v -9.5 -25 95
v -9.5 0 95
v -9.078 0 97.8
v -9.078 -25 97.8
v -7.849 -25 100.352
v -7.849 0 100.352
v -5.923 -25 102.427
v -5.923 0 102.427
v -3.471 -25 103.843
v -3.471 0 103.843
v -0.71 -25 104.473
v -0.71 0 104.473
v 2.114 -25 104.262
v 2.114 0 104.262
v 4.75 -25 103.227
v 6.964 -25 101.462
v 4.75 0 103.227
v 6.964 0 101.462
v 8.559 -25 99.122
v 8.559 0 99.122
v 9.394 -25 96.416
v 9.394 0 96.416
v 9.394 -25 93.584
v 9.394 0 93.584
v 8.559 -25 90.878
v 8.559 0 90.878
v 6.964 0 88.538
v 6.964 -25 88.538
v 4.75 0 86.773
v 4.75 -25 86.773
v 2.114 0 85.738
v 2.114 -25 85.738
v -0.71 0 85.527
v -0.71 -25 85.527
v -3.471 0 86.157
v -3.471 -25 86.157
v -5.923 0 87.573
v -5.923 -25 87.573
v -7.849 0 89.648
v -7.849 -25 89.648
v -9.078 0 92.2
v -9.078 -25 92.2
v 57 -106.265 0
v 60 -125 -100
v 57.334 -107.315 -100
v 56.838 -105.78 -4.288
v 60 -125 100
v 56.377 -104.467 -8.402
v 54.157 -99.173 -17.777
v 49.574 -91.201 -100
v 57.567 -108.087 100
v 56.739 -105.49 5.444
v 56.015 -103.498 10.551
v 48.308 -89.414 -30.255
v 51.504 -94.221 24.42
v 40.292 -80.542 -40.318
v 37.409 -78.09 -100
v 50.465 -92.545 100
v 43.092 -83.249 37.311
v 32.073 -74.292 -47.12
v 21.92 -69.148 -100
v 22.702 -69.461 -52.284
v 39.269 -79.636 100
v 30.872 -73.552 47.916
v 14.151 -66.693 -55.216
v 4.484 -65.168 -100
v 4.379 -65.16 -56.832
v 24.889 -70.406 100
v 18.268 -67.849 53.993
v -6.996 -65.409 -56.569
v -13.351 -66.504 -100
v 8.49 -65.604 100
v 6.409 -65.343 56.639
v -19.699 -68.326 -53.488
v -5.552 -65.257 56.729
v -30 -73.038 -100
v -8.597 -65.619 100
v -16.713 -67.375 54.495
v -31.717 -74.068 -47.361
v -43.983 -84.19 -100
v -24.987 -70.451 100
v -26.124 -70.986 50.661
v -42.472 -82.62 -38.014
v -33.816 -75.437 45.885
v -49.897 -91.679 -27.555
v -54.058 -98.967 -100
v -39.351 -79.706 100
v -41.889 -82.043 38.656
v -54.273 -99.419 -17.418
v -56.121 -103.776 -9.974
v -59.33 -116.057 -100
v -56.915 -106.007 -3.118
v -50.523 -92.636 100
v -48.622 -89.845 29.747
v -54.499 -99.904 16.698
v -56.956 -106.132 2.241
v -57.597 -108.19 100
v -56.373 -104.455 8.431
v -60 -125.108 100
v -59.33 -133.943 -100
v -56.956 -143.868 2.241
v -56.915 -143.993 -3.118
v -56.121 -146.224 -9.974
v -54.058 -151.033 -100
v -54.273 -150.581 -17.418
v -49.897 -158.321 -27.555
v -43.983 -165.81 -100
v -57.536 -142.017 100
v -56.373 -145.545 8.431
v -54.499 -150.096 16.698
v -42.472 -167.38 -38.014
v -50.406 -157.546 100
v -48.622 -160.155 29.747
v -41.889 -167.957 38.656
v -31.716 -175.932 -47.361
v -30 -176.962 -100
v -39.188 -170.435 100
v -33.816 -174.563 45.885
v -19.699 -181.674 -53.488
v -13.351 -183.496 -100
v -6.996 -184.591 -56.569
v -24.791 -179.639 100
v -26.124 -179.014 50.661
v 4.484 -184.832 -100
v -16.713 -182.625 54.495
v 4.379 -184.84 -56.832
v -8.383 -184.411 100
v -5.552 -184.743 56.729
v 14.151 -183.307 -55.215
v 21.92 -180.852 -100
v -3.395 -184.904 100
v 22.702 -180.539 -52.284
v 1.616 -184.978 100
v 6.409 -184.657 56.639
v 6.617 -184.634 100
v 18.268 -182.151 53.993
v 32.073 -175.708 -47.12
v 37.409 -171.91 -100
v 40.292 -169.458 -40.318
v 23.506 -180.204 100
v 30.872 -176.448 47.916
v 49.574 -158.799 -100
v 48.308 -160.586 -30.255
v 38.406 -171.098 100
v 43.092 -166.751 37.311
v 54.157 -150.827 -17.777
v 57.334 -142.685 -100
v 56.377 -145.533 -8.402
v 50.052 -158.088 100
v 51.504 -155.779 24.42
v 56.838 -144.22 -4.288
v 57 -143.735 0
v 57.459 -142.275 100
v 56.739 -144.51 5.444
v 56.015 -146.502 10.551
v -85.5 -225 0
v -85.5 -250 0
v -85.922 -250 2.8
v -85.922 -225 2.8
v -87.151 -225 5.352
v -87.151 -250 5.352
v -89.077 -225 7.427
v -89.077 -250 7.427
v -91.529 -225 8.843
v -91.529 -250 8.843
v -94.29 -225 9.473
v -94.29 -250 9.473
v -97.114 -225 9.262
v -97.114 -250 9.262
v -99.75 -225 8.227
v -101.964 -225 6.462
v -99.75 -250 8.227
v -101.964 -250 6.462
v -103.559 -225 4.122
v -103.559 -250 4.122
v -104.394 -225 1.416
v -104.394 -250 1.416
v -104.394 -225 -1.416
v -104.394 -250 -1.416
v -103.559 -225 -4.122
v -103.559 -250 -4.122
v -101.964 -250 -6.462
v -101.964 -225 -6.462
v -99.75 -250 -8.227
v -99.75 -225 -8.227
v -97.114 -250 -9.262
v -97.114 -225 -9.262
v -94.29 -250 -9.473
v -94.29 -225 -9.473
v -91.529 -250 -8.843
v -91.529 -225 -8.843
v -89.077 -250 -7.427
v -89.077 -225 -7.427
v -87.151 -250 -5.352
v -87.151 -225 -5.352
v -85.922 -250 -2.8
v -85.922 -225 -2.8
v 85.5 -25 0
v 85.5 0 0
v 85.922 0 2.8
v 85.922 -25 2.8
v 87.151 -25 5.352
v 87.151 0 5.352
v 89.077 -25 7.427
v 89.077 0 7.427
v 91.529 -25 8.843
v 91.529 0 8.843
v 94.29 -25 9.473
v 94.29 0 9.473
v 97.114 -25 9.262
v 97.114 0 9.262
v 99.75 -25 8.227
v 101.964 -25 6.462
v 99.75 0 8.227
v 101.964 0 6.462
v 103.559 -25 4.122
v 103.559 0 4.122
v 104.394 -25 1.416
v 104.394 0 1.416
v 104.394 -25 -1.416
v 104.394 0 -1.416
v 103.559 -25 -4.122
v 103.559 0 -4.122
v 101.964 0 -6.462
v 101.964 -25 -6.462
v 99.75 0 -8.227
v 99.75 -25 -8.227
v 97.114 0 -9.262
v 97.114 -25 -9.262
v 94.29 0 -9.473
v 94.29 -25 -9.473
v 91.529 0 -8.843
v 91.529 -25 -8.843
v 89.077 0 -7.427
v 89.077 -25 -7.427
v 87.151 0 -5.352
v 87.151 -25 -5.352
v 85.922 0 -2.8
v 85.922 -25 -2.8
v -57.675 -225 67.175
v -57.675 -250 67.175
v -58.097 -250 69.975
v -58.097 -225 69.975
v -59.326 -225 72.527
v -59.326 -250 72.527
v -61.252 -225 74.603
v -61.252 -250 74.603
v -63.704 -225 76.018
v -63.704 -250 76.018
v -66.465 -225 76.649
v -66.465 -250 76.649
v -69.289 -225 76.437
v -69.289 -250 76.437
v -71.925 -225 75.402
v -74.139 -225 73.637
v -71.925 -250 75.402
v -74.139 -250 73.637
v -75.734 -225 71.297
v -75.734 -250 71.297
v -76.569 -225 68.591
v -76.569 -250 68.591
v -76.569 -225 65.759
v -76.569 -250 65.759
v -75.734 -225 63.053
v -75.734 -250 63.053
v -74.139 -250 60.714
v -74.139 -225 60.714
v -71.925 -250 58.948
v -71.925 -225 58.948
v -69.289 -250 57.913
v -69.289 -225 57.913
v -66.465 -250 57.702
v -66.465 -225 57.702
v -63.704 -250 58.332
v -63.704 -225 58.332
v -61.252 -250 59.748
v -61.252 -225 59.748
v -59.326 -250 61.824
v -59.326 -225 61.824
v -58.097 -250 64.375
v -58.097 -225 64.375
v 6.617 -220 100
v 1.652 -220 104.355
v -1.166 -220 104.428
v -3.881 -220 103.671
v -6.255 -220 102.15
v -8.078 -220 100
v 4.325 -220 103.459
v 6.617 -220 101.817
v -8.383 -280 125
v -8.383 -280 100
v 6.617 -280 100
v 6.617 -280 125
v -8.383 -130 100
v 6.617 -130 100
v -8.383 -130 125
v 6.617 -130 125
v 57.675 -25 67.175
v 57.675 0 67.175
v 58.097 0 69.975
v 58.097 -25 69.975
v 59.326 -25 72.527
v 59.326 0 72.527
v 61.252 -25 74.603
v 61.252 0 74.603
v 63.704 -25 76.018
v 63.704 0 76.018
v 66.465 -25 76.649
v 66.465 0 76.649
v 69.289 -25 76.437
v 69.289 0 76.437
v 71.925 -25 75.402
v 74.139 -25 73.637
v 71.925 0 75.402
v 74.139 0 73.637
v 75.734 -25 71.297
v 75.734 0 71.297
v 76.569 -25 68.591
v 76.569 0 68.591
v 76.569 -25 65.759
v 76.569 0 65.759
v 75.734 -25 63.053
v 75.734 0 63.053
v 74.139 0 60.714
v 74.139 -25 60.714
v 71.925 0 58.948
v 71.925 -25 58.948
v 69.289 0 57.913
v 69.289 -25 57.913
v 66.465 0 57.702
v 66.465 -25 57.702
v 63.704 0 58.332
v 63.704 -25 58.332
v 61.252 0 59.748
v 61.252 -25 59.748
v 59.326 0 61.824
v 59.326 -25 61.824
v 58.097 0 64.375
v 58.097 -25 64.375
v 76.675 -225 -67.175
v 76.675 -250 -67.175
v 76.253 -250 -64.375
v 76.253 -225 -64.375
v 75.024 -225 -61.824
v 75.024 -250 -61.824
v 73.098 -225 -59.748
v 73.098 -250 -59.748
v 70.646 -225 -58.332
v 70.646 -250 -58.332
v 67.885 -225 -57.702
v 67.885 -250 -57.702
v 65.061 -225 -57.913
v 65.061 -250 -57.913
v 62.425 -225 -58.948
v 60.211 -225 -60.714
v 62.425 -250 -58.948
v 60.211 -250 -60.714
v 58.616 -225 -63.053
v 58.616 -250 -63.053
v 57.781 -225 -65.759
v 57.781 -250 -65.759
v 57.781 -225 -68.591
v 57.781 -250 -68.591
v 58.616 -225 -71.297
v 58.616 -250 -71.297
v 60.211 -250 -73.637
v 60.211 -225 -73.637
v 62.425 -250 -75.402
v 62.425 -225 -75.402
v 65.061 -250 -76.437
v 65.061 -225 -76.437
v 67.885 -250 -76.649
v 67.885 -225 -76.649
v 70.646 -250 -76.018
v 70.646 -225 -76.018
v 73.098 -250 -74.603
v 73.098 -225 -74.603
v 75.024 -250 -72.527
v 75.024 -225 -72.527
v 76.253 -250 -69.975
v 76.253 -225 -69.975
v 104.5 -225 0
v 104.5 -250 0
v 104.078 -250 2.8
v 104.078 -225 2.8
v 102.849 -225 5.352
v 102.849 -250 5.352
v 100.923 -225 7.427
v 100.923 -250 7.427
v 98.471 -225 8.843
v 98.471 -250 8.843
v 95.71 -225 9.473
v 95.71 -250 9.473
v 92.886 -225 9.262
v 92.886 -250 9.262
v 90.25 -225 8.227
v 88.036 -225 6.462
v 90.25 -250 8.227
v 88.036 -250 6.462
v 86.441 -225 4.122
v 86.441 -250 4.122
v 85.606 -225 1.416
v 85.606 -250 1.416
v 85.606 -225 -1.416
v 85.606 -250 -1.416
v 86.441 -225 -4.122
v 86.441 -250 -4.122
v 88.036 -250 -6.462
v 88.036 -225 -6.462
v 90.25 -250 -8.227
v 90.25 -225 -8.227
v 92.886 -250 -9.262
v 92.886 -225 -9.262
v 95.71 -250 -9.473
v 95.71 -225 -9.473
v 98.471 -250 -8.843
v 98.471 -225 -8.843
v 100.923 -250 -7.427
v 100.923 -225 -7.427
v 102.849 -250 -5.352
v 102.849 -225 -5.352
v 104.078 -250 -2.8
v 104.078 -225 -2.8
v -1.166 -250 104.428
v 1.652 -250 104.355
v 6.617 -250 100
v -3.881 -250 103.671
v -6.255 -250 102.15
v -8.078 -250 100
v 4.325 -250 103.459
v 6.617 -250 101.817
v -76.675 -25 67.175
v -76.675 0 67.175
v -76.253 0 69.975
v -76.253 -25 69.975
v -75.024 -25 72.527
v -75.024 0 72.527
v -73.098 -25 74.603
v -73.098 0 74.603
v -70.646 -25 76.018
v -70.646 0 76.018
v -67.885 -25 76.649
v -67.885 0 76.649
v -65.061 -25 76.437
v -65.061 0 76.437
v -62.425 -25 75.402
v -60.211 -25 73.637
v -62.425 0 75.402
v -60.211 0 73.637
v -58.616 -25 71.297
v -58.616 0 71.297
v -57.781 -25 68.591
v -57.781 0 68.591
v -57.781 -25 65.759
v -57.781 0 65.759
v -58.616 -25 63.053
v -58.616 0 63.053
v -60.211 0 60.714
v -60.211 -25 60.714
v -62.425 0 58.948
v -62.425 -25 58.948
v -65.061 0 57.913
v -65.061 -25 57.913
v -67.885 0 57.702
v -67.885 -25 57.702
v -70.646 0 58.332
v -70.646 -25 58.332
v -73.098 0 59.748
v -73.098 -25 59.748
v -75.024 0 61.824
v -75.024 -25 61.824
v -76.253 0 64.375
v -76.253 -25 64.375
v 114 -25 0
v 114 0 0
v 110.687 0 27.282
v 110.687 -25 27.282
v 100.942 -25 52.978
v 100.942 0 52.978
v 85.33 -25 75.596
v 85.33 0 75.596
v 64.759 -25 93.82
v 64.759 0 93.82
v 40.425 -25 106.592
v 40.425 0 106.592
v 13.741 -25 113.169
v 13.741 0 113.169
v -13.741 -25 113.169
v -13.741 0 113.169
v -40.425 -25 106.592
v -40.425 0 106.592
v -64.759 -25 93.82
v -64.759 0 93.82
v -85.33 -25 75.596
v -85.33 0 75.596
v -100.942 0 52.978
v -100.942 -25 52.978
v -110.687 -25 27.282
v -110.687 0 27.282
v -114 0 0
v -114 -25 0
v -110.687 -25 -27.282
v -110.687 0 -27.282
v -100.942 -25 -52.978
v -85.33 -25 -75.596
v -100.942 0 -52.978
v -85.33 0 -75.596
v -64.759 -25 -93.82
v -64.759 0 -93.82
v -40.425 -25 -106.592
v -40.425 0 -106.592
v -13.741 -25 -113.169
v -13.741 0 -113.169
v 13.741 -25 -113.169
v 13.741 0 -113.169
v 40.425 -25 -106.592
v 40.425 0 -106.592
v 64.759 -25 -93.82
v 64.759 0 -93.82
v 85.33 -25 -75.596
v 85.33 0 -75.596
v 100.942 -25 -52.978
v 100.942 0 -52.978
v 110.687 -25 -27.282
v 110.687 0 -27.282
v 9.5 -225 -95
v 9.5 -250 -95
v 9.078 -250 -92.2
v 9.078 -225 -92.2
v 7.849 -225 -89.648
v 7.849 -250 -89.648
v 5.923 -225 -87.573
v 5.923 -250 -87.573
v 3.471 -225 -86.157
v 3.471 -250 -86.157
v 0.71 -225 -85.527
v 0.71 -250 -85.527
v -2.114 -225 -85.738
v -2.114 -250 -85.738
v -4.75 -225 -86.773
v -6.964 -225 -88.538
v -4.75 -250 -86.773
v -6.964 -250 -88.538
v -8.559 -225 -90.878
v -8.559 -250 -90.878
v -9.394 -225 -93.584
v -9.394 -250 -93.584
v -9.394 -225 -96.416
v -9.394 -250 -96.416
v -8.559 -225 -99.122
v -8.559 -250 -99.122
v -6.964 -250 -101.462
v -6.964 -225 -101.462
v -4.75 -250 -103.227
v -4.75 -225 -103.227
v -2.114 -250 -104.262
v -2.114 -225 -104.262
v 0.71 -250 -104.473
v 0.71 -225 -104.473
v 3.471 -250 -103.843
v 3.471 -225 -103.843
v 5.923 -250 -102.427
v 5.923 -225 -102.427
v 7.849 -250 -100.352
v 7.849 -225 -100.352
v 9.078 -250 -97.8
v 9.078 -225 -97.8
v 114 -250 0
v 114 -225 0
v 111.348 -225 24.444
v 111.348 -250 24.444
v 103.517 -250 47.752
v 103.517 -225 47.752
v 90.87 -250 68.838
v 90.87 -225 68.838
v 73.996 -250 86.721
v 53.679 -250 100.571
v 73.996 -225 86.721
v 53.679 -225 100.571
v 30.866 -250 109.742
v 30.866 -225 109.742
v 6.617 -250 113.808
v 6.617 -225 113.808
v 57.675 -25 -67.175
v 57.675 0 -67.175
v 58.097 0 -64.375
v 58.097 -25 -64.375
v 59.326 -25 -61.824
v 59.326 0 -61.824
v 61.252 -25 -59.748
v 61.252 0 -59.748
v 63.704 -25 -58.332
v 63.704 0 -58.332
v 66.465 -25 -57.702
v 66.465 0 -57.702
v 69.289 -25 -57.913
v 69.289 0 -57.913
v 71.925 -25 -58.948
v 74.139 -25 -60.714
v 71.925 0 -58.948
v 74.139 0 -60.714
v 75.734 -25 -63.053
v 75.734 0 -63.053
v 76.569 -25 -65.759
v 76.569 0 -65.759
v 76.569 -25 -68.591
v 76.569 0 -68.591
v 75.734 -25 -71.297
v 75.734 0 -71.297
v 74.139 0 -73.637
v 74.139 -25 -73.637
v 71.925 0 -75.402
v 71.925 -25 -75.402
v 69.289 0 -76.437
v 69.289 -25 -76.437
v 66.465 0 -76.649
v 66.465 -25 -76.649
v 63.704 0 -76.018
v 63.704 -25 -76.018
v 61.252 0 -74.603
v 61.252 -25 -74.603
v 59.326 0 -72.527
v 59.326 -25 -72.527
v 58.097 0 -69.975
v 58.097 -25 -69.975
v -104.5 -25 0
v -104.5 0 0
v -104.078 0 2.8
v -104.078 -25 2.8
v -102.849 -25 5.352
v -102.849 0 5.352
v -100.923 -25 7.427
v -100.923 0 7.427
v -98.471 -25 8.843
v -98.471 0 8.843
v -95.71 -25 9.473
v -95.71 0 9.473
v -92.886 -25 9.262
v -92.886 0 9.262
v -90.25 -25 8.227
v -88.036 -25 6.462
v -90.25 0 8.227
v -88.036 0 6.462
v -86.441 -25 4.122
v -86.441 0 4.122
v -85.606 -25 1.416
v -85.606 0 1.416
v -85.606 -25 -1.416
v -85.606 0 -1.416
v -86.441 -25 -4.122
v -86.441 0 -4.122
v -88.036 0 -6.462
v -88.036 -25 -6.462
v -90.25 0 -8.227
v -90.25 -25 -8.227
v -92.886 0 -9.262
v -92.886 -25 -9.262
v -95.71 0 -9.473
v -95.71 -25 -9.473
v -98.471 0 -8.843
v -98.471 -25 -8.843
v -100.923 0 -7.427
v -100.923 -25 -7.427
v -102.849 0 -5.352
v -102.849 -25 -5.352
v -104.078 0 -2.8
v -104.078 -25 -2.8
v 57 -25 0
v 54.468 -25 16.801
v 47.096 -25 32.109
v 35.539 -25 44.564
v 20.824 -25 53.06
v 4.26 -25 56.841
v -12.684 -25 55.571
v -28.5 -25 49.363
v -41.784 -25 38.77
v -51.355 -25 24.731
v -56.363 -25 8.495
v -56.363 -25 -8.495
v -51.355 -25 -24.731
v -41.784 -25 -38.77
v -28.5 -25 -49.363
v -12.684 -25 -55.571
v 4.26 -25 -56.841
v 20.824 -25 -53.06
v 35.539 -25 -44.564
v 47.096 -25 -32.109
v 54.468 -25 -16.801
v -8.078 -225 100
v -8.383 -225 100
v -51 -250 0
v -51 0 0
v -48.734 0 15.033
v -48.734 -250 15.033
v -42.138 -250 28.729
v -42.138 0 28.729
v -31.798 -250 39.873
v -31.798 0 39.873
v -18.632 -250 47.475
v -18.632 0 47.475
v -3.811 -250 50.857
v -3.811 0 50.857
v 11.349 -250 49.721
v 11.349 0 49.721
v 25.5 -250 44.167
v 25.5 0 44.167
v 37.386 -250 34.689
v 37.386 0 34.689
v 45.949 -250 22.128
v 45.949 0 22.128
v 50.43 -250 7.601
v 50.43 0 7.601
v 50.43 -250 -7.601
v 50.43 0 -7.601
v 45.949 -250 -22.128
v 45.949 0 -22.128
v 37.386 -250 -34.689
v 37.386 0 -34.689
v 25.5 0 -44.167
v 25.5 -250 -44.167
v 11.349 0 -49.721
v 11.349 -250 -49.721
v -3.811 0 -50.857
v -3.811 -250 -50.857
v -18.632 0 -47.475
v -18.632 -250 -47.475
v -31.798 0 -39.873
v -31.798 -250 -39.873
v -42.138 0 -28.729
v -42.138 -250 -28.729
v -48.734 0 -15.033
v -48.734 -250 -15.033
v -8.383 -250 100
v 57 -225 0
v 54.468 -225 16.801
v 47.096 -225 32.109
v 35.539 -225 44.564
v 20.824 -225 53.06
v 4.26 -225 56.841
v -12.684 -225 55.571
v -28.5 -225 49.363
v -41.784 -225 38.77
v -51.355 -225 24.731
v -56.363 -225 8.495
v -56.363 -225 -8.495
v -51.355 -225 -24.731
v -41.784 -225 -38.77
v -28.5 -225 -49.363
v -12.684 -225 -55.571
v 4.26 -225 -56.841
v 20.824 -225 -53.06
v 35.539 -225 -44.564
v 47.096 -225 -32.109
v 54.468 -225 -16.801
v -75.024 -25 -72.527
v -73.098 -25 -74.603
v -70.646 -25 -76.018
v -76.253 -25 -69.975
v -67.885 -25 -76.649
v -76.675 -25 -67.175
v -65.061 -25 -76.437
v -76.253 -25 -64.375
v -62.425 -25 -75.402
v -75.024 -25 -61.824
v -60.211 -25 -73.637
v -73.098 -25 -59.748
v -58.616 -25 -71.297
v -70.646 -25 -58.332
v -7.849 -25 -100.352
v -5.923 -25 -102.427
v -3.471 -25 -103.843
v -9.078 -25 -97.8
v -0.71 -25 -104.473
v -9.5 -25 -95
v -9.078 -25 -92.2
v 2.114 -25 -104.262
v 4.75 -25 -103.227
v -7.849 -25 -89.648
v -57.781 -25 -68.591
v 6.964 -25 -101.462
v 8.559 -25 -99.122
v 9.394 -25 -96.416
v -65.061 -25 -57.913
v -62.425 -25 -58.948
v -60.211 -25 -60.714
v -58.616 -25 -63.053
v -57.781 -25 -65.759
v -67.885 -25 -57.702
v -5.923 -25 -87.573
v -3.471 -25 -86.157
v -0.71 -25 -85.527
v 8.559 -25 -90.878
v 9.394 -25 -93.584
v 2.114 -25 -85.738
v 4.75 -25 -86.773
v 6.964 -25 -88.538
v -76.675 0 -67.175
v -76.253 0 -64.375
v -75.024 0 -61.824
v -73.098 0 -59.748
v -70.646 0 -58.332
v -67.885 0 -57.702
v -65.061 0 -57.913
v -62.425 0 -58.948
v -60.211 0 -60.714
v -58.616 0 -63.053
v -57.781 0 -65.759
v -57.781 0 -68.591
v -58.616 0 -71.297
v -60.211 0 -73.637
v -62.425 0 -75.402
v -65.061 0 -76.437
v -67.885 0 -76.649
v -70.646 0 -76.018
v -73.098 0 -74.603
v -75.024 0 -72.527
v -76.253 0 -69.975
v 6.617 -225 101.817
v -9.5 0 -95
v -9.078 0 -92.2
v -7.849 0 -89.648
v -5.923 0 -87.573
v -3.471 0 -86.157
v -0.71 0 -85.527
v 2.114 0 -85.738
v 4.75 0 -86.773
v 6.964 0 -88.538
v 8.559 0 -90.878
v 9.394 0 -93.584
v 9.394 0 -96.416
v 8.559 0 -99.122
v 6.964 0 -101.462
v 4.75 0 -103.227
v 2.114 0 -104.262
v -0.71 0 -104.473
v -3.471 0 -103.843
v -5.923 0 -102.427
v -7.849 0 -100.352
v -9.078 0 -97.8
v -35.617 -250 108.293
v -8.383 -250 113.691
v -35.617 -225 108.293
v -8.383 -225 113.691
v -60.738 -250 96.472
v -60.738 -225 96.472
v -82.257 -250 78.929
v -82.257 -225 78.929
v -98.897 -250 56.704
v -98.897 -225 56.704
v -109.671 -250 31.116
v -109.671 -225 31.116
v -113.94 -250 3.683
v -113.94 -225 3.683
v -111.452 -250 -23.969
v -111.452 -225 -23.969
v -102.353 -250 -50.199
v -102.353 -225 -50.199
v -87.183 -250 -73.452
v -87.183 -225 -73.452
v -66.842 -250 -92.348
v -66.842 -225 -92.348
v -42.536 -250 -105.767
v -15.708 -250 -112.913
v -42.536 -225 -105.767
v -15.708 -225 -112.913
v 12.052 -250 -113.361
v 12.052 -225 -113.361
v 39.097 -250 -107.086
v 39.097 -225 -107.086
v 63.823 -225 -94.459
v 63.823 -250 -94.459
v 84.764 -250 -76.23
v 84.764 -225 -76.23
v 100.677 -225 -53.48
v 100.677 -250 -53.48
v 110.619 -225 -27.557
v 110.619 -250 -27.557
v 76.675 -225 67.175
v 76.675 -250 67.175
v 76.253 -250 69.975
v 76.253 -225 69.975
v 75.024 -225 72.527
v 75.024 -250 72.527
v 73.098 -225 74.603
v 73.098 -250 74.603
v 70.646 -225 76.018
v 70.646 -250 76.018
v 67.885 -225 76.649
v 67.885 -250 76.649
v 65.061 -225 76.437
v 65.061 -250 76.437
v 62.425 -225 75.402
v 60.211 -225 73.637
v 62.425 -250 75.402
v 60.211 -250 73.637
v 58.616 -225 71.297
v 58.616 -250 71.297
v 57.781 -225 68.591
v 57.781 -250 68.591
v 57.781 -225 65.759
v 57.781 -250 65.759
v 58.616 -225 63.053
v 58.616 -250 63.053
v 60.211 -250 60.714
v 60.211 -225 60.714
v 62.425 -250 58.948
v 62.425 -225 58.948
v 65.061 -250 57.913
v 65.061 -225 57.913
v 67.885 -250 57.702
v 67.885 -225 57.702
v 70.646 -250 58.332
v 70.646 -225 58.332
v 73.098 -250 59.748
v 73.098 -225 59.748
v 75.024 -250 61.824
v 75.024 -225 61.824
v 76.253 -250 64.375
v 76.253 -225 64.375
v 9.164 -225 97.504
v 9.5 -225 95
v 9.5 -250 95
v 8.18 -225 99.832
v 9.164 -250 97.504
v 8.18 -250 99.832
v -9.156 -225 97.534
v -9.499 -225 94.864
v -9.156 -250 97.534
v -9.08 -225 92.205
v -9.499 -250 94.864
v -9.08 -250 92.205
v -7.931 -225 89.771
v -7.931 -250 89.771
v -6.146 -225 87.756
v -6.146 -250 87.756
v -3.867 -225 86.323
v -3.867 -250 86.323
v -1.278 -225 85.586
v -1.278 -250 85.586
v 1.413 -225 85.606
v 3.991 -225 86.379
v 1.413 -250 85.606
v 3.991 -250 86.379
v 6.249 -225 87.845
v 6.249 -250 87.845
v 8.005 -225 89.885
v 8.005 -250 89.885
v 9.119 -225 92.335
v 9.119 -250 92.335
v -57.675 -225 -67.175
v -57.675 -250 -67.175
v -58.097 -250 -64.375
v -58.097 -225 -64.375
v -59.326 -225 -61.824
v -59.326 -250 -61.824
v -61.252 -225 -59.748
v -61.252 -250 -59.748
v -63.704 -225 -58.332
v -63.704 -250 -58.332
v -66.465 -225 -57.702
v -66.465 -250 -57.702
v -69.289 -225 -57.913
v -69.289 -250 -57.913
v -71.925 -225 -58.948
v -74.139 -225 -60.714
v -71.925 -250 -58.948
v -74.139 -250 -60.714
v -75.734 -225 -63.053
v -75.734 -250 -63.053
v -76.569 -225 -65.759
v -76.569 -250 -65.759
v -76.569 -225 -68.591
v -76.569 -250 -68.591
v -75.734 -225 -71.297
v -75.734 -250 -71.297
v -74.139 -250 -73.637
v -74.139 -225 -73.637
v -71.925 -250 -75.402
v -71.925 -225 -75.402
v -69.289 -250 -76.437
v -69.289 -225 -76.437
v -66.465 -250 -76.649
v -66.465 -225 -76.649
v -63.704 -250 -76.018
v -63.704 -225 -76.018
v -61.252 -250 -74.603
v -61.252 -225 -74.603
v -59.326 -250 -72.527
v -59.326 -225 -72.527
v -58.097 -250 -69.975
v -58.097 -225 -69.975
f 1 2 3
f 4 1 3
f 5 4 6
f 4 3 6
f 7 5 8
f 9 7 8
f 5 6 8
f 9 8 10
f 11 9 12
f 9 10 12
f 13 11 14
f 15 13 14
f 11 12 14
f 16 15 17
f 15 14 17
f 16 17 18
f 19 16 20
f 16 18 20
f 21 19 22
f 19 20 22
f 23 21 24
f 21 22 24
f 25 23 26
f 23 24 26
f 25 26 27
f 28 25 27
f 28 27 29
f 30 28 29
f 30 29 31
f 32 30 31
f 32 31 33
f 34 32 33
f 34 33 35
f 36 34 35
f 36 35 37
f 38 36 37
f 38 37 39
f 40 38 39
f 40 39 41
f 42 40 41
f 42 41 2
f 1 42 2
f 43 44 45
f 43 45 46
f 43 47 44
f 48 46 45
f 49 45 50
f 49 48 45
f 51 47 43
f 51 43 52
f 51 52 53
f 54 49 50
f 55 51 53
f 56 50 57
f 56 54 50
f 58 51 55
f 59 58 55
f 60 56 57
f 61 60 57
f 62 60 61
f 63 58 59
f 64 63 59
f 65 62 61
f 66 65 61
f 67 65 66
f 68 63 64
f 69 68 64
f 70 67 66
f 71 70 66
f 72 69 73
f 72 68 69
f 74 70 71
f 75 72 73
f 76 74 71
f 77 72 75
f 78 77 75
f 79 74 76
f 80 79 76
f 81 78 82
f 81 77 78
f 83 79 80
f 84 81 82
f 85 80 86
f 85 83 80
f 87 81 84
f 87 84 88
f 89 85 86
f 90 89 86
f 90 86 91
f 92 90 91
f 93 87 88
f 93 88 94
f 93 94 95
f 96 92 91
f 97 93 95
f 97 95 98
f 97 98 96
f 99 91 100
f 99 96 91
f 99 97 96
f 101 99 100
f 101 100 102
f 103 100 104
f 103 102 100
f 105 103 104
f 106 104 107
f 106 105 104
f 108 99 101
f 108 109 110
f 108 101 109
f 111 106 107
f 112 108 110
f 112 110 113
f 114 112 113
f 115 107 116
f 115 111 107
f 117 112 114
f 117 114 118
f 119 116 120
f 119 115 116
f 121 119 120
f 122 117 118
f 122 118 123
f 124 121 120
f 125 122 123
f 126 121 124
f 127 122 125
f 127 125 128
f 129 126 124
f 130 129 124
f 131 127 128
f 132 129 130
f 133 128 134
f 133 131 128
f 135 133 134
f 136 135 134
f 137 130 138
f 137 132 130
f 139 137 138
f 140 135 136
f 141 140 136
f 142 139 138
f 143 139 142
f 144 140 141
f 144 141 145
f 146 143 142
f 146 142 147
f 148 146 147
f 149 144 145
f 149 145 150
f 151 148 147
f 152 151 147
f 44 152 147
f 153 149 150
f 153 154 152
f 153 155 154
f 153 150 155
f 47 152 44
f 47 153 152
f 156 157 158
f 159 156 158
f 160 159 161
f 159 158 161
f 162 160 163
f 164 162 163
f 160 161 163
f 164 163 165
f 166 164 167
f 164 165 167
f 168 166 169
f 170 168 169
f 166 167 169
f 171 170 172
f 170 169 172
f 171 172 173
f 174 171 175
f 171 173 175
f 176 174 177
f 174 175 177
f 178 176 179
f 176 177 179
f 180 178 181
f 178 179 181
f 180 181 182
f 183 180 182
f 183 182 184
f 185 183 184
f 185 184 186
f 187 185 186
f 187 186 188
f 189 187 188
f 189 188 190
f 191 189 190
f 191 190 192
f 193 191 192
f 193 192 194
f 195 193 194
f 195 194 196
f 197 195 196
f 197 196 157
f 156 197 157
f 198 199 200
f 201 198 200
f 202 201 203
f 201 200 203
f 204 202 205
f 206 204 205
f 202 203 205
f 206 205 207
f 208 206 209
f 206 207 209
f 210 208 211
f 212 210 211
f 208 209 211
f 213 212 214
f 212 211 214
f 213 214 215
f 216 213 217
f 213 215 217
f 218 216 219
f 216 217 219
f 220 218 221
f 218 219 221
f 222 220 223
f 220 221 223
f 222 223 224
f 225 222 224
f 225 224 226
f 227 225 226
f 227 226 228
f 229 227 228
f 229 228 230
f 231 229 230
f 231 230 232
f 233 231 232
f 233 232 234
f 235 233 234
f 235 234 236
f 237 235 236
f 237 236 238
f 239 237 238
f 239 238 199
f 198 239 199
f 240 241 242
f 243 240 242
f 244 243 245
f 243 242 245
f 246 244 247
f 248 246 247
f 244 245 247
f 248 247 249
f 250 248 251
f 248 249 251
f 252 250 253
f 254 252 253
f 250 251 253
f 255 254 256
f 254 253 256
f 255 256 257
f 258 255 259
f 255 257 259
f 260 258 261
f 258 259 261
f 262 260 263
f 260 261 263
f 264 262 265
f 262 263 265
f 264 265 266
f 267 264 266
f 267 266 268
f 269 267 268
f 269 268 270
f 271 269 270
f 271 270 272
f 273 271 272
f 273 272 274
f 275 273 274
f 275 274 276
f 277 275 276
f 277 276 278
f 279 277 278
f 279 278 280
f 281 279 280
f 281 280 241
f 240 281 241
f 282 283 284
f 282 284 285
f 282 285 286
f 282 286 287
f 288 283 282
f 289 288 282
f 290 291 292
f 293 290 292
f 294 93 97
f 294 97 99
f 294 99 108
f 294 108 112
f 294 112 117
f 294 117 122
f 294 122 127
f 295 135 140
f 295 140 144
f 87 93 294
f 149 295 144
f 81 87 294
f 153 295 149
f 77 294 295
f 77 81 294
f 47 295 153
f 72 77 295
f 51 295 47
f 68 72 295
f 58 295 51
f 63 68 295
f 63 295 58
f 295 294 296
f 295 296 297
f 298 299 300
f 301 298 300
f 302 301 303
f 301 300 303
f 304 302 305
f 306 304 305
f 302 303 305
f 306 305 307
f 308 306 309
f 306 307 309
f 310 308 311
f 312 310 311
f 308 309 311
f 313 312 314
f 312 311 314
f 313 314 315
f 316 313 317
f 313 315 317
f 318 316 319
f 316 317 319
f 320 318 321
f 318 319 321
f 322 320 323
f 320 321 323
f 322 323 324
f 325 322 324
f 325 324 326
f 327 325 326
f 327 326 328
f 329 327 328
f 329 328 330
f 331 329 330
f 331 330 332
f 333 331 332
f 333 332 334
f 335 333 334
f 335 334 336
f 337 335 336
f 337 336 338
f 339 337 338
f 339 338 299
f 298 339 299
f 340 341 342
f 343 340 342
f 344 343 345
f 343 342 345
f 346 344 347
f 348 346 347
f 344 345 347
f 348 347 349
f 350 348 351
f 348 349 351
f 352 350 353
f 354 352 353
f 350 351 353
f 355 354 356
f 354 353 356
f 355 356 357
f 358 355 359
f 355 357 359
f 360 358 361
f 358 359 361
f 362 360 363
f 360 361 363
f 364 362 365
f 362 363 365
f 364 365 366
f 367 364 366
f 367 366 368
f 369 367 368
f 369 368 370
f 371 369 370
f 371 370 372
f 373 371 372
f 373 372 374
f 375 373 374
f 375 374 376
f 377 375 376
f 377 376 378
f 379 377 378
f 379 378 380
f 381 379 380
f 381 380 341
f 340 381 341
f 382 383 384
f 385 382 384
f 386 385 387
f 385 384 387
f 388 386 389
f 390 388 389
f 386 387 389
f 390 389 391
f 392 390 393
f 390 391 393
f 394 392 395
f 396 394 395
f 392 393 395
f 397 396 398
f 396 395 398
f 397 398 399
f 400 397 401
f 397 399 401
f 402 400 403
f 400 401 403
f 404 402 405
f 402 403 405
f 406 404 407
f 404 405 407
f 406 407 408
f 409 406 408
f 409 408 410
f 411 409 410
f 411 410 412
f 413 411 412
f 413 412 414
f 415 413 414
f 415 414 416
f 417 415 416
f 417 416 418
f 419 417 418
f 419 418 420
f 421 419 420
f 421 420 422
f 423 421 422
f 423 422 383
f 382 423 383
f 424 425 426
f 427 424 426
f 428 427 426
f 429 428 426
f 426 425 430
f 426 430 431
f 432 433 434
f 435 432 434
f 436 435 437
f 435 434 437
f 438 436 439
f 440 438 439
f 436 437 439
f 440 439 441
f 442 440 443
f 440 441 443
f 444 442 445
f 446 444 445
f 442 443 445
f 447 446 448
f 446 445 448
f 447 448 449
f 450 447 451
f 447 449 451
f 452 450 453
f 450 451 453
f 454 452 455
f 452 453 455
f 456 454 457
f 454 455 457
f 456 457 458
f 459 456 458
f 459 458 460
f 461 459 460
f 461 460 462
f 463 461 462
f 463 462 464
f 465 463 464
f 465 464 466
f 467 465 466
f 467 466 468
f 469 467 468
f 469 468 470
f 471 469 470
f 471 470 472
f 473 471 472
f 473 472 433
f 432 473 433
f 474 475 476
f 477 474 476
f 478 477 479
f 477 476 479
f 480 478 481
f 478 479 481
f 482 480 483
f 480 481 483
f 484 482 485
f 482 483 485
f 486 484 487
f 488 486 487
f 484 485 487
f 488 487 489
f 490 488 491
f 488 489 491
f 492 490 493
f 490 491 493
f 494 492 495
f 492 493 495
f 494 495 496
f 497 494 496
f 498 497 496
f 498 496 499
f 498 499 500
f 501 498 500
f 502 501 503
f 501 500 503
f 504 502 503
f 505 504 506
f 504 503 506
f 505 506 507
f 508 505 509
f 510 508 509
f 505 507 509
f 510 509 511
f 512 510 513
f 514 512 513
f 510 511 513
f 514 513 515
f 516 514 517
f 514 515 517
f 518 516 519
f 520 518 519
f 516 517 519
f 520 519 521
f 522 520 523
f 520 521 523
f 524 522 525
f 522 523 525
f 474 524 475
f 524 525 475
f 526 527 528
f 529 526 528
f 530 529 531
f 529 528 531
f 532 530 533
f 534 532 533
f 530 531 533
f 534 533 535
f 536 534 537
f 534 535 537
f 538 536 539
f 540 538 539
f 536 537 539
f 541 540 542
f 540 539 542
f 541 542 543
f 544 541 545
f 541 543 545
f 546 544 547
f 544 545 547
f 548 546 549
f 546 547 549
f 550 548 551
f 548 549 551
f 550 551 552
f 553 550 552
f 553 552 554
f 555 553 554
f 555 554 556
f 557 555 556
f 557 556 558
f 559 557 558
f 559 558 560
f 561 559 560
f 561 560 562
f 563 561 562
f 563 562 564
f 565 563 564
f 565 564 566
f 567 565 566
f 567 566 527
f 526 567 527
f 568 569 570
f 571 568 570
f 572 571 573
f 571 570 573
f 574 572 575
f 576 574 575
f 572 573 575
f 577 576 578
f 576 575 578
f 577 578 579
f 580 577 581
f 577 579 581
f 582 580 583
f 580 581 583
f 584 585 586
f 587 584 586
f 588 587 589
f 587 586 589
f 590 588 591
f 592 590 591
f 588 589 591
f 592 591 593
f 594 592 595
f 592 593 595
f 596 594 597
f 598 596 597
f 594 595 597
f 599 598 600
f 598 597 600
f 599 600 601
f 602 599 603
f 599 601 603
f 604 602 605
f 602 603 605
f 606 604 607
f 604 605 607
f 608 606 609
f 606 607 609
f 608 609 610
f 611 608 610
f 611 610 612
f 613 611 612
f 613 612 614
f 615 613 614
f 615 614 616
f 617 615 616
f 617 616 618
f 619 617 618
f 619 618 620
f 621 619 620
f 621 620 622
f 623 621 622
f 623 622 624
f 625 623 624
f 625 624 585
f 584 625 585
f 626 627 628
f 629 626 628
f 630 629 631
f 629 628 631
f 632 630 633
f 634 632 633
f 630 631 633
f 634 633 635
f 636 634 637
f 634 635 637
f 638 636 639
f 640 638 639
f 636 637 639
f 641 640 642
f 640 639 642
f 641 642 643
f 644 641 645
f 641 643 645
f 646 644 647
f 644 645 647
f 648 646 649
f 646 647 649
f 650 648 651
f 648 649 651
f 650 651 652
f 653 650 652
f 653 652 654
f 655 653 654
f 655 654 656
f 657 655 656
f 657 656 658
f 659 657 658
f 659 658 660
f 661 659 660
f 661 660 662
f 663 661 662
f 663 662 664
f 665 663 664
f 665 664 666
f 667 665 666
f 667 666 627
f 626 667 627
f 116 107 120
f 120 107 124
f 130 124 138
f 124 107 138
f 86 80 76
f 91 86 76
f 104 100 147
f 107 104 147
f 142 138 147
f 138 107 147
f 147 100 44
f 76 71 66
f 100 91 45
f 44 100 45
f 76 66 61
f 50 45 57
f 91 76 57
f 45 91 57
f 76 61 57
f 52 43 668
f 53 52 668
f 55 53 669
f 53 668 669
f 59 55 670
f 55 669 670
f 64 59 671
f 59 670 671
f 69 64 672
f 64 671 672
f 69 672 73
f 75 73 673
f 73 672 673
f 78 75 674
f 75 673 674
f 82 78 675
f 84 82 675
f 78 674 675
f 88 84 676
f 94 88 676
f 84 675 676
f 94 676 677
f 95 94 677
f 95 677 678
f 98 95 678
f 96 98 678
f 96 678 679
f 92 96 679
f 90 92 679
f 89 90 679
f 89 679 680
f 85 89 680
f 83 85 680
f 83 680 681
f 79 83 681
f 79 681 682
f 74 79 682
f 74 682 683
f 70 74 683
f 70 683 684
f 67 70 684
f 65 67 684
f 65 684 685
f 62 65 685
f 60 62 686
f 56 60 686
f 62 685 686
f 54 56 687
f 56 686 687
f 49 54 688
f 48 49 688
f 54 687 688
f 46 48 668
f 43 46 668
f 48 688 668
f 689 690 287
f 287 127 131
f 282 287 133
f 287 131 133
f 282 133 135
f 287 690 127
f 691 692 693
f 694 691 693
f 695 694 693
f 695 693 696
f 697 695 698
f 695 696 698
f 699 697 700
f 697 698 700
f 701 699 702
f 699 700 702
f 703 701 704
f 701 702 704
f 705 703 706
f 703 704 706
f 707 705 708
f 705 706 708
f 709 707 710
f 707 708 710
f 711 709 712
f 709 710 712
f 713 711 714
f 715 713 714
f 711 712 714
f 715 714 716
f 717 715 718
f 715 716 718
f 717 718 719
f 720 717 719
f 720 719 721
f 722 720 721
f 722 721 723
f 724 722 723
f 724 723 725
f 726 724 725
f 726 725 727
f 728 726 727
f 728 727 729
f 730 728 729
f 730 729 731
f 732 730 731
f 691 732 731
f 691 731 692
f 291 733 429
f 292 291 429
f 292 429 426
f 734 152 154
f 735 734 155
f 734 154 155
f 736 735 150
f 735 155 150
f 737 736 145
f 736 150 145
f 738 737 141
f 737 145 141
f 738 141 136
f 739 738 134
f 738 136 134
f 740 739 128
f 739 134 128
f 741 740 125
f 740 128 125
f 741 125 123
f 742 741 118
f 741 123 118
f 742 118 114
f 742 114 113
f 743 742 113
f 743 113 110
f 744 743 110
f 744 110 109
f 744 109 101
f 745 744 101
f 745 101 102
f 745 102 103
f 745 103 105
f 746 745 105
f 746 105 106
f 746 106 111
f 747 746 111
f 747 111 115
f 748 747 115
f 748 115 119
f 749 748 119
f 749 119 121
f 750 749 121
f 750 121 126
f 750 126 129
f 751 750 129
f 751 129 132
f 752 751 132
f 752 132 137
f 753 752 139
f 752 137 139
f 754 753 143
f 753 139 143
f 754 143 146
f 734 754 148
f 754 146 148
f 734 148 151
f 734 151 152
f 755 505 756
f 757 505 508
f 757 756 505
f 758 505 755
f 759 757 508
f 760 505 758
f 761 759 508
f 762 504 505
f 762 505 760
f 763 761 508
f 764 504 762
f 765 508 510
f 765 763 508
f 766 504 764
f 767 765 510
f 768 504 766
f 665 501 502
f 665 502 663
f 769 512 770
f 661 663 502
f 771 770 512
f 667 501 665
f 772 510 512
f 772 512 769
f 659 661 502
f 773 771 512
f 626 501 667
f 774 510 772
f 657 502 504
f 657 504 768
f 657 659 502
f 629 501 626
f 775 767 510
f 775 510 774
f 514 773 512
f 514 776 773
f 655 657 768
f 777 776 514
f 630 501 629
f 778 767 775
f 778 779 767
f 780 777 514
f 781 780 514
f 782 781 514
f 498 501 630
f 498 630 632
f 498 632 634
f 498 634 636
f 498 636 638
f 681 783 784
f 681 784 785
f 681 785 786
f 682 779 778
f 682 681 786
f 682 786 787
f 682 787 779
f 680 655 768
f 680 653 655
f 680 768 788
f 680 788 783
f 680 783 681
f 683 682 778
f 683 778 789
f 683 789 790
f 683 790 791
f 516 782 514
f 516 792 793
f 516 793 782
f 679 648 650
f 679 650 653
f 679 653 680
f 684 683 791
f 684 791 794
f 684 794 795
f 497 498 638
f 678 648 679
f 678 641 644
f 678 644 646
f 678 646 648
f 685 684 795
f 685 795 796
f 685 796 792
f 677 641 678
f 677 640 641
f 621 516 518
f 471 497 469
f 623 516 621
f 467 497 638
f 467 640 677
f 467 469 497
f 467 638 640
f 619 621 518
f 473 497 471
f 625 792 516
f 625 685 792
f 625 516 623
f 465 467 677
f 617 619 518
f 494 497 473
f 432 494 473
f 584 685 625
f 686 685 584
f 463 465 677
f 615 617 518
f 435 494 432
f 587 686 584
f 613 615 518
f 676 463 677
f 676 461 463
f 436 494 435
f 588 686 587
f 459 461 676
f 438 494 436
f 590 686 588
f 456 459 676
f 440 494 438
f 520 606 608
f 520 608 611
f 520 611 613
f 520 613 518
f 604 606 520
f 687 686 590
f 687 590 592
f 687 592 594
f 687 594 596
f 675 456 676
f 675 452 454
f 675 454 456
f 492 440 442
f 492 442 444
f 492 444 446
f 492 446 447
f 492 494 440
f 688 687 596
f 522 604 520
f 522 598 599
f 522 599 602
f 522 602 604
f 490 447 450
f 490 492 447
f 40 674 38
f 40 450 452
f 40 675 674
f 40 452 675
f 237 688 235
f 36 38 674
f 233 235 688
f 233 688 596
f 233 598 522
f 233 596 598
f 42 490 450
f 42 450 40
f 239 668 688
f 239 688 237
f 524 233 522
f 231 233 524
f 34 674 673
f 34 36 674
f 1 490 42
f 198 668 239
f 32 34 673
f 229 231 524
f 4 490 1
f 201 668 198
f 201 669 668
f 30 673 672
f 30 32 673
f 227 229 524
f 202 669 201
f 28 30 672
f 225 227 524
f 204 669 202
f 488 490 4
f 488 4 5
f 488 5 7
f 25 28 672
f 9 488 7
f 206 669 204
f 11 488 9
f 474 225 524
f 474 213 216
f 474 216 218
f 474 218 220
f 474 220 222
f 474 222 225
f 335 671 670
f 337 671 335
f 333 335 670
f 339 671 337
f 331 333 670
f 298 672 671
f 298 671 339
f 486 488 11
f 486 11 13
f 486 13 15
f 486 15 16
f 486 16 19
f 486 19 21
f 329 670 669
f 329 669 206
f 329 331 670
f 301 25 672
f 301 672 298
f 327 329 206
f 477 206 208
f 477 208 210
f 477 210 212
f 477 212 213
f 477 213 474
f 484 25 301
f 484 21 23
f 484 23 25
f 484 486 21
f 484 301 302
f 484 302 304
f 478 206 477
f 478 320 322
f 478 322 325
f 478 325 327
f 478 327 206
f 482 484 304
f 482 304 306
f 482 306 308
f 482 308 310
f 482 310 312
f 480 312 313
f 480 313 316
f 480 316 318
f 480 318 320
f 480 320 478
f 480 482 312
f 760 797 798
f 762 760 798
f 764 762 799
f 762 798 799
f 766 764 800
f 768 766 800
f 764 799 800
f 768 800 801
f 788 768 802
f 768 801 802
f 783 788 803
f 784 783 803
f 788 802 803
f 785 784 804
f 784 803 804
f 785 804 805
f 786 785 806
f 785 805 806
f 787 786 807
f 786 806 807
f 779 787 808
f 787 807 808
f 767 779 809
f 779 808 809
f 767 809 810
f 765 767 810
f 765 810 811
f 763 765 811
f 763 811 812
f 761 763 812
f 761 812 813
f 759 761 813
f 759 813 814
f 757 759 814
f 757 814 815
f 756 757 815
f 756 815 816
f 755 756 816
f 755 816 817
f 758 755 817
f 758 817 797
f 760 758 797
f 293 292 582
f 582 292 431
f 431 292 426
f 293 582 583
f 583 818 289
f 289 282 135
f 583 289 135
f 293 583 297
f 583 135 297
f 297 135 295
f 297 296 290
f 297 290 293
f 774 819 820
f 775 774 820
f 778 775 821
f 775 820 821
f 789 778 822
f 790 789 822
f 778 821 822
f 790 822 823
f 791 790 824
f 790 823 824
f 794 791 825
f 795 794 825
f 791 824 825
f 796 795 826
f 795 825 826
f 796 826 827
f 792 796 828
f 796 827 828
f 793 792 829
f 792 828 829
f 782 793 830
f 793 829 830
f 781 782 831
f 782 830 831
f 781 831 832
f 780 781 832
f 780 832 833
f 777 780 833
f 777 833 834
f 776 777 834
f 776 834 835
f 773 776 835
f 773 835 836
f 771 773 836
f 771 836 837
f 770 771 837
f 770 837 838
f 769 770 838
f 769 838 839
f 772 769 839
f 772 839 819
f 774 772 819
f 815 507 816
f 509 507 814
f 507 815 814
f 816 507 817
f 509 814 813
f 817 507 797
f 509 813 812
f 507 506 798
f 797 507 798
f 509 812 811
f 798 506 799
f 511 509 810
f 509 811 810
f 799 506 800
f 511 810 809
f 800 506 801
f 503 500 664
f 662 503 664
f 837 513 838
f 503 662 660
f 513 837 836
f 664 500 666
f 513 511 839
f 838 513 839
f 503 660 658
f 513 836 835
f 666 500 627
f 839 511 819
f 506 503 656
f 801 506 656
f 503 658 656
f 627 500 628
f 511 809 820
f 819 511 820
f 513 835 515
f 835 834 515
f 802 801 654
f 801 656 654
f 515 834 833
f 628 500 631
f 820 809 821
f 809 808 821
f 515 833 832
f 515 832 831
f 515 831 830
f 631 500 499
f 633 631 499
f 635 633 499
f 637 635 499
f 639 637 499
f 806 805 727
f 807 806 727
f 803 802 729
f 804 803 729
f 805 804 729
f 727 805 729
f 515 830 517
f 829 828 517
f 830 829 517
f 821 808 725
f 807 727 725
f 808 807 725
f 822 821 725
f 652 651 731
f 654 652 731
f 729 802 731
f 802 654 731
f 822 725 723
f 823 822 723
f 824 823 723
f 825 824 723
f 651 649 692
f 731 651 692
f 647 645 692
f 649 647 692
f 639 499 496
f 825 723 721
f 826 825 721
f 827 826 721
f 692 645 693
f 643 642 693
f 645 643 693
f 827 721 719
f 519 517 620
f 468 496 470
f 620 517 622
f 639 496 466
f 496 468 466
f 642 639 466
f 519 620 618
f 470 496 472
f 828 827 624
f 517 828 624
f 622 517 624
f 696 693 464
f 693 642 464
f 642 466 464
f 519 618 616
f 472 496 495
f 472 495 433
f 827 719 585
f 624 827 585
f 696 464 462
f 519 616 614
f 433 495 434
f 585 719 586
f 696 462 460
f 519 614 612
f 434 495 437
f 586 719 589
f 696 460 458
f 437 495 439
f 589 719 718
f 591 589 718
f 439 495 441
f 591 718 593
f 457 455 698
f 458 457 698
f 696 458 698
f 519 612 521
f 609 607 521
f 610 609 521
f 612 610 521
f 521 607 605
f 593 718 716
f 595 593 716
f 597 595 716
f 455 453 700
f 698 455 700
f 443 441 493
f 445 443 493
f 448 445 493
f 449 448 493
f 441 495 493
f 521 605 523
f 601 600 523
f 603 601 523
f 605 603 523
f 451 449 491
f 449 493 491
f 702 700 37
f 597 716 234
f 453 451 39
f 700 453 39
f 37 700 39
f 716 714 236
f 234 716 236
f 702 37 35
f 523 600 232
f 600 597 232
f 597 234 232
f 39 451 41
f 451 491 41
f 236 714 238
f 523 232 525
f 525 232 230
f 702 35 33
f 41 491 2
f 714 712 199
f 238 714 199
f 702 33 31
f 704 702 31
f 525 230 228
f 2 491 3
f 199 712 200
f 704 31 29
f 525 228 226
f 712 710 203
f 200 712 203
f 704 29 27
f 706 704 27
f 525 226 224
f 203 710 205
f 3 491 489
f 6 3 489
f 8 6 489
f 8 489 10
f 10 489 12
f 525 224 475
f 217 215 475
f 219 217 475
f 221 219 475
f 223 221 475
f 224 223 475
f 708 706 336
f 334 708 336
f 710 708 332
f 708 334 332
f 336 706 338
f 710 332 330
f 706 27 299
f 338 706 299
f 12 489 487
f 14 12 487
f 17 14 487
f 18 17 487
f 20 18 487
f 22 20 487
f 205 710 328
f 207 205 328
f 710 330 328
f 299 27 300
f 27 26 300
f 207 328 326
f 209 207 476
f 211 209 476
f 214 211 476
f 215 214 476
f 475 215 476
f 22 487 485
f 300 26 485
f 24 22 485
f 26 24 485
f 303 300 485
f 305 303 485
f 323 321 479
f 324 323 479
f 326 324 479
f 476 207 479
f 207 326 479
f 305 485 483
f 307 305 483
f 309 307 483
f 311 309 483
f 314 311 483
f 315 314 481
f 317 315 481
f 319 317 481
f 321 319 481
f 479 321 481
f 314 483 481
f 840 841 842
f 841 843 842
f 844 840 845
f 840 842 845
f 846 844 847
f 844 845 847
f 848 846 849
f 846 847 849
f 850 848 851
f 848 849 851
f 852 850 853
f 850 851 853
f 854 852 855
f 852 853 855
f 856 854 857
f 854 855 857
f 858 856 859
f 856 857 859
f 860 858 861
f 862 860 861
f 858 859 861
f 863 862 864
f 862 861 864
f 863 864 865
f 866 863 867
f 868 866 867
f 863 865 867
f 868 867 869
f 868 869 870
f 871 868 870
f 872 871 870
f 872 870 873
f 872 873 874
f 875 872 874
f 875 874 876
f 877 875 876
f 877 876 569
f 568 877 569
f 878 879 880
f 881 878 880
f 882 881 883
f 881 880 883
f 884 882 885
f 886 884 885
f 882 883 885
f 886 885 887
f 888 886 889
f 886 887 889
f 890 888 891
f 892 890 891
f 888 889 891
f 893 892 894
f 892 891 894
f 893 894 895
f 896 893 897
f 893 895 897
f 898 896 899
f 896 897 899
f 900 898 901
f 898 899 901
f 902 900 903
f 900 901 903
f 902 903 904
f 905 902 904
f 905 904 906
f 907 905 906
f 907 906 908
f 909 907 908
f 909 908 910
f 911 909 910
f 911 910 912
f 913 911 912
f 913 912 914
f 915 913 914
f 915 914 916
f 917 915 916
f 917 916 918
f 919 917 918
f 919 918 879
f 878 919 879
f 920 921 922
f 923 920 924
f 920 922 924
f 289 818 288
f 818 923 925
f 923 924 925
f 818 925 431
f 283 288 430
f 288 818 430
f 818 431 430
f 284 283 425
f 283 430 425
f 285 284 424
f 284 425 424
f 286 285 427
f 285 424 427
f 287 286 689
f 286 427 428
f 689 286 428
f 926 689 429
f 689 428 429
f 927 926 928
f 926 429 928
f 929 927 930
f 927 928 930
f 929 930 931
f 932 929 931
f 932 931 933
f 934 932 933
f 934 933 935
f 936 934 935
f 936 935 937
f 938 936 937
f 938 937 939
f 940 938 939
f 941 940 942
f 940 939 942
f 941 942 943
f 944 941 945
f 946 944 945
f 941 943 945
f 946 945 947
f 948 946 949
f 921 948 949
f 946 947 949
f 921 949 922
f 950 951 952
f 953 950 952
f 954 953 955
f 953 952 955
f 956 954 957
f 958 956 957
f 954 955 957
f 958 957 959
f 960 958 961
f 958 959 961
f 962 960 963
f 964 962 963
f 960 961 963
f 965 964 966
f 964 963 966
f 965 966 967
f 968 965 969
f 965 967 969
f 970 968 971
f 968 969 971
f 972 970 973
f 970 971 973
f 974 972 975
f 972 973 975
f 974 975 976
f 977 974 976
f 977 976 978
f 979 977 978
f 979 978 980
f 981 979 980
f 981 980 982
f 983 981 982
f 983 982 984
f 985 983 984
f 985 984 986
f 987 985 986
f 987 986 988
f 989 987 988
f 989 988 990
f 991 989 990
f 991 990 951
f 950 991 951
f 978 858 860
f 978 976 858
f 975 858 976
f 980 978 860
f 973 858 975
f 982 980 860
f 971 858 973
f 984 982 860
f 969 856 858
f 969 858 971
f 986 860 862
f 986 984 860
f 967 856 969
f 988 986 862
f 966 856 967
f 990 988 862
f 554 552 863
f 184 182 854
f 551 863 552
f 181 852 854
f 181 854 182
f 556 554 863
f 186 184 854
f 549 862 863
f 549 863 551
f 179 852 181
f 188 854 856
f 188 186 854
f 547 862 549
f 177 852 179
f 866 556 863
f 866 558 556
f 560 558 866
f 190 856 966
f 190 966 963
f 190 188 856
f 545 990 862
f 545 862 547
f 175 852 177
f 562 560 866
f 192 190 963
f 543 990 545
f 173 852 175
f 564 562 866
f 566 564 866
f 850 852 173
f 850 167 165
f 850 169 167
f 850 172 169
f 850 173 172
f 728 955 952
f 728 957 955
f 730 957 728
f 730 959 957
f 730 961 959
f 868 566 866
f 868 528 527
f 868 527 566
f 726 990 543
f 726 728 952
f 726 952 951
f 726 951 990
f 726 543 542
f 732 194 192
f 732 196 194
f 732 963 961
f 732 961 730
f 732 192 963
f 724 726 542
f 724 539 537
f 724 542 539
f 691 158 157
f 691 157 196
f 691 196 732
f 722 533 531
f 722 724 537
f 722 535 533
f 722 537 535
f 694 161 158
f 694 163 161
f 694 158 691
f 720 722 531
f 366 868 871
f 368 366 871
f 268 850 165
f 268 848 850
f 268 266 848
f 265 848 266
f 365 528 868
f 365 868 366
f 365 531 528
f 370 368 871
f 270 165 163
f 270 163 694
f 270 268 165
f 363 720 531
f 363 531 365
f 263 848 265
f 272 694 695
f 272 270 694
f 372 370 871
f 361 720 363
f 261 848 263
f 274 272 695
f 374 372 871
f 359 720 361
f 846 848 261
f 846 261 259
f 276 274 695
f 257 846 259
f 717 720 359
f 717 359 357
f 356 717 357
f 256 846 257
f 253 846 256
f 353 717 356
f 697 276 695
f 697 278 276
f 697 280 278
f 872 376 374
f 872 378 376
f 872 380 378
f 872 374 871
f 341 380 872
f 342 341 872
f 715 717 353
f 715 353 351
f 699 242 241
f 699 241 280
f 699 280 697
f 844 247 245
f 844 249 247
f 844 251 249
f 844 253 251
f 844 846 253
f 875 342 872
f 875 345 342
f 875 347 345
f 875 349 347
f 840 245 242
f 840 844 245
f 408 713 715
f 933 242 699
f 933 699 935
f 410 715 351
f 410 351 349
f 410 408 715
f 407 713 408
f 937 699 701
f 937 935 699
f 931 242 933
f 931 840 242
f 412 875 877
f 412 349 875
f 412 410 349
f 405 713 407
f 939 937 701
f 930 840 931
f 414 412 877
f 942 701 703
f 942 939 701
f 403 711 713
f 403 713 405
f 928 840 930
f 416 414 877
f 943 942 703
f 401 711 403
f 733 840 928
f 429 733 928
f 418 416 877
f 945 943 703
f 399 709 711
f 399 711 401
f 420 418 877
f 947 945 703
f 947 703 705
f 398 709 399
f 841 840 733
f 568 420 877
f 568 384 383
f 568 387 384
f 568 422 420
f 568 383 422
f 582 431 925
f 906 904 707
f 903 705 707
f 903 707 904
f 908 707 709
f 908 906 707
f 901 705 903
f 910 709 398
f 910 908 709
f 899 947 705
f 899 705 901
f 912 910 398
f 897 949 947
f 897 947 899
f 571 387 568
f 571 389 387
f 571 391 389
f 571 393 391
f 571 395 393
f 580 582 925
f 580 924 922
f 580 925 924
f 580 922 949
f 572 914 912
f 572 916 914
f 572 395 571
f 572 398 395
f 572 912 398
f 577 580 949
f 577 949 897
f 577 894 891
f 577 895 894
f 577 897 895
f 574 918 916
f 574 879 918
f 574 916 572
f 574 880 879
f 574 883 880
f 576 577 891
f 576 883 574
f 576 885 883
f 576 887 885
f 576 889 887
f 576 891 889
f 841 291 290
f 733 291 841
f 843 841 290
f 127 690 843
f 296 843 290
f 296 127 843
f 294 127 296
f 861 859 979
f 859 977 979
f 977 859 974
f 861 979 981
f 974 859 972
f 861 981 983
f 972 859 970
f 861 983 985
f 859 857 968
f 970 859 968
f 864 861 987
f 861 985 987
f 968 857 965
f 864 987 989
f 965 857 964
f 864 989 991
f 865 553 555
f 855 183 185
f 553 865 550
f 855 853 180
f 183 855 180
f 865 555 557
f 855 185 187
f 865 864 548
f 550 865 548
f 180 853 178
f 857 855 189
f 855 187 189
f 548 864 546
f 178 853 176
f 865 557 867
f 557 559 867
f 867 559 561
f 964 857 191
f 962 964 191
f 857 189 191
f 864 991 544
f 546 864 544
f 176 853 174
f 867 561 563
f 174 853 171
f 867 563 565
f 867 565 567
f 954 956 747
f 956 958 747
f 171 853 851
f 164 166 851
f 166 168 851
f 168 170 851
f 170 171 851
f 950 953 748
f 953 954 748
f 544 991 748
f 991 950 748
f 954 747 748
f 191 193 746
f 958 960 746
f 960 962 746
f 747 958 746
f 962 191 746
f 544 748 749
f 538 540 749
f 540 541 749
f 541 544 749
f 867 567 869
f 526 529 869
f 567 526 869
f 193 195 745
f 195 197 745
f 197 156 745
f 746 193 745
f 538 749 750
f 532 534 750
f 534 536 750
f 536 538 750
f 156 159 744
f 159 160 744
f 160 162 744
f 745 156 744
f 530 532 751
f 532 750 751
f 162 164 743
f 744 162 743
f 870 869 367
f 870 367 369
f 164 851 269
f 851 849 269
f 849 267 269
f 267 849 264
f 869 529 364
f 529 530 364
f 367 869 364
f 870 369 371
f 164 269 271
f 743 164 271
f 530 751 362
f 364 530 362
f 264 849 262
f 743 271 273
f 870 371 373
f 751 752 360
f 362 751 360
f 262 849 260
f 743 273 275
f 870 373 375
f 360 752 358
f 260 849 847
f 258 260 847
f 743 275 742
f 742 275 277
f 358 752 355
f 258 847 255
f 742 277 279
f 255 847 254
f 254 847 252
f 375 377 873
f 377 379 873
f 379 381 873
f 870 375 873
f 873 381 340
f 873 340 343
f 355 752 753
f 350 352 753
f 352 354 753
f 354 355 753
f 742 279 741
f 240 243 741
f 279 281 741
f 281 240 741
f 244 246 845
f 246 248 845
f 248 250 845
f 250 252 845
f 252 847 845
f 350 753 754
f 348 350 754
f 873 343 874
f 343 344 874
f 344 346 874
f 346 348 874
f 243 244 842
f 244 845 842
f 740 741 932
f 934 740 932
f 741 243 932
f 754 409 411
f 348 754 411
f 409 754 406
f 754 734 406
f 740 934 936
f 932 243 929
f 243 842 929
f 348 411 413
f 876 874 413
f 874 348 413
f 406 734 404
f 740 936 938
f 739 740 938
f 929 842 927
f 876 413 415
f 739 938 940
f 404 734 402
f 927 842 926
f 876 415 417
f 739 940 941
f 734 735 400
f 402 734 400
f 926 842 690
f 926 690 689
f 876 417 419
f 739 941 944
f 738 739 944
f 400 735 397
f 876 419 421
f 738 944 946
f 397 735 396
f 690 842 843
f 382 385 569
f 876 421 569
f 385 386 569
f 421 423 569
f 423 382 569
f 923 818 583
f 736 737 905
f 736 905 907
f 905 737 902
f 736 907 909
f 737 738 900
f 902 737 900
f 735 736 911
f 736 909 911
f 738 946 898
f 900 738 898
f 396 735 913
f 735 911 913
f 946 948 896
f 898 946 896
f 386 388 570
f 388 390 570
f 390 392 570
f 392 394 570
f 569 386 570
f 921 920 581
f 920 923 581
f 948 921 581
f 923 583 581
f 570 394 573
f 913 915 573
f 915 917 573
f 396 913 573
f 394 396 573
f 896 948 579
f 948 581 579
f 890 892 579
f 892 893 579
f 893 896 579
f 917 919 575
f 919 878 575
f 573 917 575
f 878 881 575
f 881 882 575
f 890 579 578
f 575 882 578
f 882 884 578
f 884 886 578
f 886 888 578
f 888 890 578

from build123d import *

# Parameters (mm, degrees)
F0_R      = 114
F1_DEPTH  = 25
F2_R      = 57
F3_DEPTH  = 200
F4_R      = 114
F5_DEPTH  = 25
F6_R      = 60
F7_DEPTH  = 100
F8_W      = 15
F8_H      = 150
F9_DEPTH  = 25
F10_R     = 9.5
F11_DEPTH = 30
F12_R     = 9.5
F13_DEPTH = 30
F14_R     = 51
F15_DEPTH = 1000


with BuildPart() as f1:
    # F0 (on Front) → F1 (new body)
    with BuildSketch(Plane.XZ):
        Circle(F0_R)
    extrude(amount=F1_DEPTH)

    # F2 (on face) → F3 (join)
    with BuildSketch(Plane.XZ.offset(25)):
        Circle(F2_R)
    extrude(amount=F3_DEPTH)

    # F4 (on face) → F5 (join)
    with BuildSketch(Plane.XZ.offset(225)):
        Circle(F4_R)
    extrude(amount=F5_DEPTH)

    # F6 (on Top) → F7 (join, symmetric)
    with BuildSketch(Plane.XY):
        with Locations((0, -125)):
            Circle(F6_R)
    extrude(amount=F7_DEPTH, both=True)

    # F8 (on face) → F9 (join)
    with BuildSketch(Plane.XY.offset(100)):
        with Locations((-0.883462, -205)):
            Rectangle(F8_W, F8_H)
    extrude(amount=F9_DEPTH)

    # F10 (on face) → F11 (cut)
    with BuildSketch(Plane.XZ.offset(250)):
        with Locations((0, 95)):
            Circle(F10_R)
        with Locations((-67.175144, 67.175144)):
            Circle(F10_R)
        with Locations((-95, 0)):
            Circle(F10_R)
        with Locations((-67.175144, -67.175144)):
            Circle(F10_R)
        with Locations((0, -95)):
            Circle(F10_R)
        with Locations((67.175144, -67.175144)):
            Circle(F10_R)
        with Locations((95, 0)):
            Circle(F10_R)
        with Locations((67.175144, 67.175144)):
            Circle(F10_R)
    extrude(amount=-F11_DEPTH, mode=Mode.SUBTRACT)

    # F12 (on face) → F13 (cut)
    with BuildSketch(Plane(origin=(0, 0, 0), x_dir=(-1, 0, 0), z_dir=(0, 1, 0))):
        with Locations((0, 95)):
            Circle(F12_R)
        with Locations((-67.175144, 67.175144)):
            Circle(F12_R)
        with Locations((-95, 0)):
            Circle(F12_R)
        with Locations((-67.175144, -67.175144)):
            Circle(F12_R)
        with Locations((0, -95)):
            Circle(F12_R)
        with Locations((67.175144, -67.175144)):
            Circle(F12_R)
        with Locations((95, 0)):
            Circle(F12_R)
        with Locations((67.175144, 67.175144)):
            Circle(F12_R)
    extrude(amount=-F13_DEPTH, mode=Mode.SUBTRACT)

    # F14 (on face) → F15 (cut)
    with BuildSketch(Plane(origin=(0, 0, 0), x_dir=(-1, 0, 0), z_dir=(0, 1, 0))):
        Circle(F14_R)
    extrude(amount=-F15_DEPTH, mode=Mode.SUBTRACT)


solid = f1.part
